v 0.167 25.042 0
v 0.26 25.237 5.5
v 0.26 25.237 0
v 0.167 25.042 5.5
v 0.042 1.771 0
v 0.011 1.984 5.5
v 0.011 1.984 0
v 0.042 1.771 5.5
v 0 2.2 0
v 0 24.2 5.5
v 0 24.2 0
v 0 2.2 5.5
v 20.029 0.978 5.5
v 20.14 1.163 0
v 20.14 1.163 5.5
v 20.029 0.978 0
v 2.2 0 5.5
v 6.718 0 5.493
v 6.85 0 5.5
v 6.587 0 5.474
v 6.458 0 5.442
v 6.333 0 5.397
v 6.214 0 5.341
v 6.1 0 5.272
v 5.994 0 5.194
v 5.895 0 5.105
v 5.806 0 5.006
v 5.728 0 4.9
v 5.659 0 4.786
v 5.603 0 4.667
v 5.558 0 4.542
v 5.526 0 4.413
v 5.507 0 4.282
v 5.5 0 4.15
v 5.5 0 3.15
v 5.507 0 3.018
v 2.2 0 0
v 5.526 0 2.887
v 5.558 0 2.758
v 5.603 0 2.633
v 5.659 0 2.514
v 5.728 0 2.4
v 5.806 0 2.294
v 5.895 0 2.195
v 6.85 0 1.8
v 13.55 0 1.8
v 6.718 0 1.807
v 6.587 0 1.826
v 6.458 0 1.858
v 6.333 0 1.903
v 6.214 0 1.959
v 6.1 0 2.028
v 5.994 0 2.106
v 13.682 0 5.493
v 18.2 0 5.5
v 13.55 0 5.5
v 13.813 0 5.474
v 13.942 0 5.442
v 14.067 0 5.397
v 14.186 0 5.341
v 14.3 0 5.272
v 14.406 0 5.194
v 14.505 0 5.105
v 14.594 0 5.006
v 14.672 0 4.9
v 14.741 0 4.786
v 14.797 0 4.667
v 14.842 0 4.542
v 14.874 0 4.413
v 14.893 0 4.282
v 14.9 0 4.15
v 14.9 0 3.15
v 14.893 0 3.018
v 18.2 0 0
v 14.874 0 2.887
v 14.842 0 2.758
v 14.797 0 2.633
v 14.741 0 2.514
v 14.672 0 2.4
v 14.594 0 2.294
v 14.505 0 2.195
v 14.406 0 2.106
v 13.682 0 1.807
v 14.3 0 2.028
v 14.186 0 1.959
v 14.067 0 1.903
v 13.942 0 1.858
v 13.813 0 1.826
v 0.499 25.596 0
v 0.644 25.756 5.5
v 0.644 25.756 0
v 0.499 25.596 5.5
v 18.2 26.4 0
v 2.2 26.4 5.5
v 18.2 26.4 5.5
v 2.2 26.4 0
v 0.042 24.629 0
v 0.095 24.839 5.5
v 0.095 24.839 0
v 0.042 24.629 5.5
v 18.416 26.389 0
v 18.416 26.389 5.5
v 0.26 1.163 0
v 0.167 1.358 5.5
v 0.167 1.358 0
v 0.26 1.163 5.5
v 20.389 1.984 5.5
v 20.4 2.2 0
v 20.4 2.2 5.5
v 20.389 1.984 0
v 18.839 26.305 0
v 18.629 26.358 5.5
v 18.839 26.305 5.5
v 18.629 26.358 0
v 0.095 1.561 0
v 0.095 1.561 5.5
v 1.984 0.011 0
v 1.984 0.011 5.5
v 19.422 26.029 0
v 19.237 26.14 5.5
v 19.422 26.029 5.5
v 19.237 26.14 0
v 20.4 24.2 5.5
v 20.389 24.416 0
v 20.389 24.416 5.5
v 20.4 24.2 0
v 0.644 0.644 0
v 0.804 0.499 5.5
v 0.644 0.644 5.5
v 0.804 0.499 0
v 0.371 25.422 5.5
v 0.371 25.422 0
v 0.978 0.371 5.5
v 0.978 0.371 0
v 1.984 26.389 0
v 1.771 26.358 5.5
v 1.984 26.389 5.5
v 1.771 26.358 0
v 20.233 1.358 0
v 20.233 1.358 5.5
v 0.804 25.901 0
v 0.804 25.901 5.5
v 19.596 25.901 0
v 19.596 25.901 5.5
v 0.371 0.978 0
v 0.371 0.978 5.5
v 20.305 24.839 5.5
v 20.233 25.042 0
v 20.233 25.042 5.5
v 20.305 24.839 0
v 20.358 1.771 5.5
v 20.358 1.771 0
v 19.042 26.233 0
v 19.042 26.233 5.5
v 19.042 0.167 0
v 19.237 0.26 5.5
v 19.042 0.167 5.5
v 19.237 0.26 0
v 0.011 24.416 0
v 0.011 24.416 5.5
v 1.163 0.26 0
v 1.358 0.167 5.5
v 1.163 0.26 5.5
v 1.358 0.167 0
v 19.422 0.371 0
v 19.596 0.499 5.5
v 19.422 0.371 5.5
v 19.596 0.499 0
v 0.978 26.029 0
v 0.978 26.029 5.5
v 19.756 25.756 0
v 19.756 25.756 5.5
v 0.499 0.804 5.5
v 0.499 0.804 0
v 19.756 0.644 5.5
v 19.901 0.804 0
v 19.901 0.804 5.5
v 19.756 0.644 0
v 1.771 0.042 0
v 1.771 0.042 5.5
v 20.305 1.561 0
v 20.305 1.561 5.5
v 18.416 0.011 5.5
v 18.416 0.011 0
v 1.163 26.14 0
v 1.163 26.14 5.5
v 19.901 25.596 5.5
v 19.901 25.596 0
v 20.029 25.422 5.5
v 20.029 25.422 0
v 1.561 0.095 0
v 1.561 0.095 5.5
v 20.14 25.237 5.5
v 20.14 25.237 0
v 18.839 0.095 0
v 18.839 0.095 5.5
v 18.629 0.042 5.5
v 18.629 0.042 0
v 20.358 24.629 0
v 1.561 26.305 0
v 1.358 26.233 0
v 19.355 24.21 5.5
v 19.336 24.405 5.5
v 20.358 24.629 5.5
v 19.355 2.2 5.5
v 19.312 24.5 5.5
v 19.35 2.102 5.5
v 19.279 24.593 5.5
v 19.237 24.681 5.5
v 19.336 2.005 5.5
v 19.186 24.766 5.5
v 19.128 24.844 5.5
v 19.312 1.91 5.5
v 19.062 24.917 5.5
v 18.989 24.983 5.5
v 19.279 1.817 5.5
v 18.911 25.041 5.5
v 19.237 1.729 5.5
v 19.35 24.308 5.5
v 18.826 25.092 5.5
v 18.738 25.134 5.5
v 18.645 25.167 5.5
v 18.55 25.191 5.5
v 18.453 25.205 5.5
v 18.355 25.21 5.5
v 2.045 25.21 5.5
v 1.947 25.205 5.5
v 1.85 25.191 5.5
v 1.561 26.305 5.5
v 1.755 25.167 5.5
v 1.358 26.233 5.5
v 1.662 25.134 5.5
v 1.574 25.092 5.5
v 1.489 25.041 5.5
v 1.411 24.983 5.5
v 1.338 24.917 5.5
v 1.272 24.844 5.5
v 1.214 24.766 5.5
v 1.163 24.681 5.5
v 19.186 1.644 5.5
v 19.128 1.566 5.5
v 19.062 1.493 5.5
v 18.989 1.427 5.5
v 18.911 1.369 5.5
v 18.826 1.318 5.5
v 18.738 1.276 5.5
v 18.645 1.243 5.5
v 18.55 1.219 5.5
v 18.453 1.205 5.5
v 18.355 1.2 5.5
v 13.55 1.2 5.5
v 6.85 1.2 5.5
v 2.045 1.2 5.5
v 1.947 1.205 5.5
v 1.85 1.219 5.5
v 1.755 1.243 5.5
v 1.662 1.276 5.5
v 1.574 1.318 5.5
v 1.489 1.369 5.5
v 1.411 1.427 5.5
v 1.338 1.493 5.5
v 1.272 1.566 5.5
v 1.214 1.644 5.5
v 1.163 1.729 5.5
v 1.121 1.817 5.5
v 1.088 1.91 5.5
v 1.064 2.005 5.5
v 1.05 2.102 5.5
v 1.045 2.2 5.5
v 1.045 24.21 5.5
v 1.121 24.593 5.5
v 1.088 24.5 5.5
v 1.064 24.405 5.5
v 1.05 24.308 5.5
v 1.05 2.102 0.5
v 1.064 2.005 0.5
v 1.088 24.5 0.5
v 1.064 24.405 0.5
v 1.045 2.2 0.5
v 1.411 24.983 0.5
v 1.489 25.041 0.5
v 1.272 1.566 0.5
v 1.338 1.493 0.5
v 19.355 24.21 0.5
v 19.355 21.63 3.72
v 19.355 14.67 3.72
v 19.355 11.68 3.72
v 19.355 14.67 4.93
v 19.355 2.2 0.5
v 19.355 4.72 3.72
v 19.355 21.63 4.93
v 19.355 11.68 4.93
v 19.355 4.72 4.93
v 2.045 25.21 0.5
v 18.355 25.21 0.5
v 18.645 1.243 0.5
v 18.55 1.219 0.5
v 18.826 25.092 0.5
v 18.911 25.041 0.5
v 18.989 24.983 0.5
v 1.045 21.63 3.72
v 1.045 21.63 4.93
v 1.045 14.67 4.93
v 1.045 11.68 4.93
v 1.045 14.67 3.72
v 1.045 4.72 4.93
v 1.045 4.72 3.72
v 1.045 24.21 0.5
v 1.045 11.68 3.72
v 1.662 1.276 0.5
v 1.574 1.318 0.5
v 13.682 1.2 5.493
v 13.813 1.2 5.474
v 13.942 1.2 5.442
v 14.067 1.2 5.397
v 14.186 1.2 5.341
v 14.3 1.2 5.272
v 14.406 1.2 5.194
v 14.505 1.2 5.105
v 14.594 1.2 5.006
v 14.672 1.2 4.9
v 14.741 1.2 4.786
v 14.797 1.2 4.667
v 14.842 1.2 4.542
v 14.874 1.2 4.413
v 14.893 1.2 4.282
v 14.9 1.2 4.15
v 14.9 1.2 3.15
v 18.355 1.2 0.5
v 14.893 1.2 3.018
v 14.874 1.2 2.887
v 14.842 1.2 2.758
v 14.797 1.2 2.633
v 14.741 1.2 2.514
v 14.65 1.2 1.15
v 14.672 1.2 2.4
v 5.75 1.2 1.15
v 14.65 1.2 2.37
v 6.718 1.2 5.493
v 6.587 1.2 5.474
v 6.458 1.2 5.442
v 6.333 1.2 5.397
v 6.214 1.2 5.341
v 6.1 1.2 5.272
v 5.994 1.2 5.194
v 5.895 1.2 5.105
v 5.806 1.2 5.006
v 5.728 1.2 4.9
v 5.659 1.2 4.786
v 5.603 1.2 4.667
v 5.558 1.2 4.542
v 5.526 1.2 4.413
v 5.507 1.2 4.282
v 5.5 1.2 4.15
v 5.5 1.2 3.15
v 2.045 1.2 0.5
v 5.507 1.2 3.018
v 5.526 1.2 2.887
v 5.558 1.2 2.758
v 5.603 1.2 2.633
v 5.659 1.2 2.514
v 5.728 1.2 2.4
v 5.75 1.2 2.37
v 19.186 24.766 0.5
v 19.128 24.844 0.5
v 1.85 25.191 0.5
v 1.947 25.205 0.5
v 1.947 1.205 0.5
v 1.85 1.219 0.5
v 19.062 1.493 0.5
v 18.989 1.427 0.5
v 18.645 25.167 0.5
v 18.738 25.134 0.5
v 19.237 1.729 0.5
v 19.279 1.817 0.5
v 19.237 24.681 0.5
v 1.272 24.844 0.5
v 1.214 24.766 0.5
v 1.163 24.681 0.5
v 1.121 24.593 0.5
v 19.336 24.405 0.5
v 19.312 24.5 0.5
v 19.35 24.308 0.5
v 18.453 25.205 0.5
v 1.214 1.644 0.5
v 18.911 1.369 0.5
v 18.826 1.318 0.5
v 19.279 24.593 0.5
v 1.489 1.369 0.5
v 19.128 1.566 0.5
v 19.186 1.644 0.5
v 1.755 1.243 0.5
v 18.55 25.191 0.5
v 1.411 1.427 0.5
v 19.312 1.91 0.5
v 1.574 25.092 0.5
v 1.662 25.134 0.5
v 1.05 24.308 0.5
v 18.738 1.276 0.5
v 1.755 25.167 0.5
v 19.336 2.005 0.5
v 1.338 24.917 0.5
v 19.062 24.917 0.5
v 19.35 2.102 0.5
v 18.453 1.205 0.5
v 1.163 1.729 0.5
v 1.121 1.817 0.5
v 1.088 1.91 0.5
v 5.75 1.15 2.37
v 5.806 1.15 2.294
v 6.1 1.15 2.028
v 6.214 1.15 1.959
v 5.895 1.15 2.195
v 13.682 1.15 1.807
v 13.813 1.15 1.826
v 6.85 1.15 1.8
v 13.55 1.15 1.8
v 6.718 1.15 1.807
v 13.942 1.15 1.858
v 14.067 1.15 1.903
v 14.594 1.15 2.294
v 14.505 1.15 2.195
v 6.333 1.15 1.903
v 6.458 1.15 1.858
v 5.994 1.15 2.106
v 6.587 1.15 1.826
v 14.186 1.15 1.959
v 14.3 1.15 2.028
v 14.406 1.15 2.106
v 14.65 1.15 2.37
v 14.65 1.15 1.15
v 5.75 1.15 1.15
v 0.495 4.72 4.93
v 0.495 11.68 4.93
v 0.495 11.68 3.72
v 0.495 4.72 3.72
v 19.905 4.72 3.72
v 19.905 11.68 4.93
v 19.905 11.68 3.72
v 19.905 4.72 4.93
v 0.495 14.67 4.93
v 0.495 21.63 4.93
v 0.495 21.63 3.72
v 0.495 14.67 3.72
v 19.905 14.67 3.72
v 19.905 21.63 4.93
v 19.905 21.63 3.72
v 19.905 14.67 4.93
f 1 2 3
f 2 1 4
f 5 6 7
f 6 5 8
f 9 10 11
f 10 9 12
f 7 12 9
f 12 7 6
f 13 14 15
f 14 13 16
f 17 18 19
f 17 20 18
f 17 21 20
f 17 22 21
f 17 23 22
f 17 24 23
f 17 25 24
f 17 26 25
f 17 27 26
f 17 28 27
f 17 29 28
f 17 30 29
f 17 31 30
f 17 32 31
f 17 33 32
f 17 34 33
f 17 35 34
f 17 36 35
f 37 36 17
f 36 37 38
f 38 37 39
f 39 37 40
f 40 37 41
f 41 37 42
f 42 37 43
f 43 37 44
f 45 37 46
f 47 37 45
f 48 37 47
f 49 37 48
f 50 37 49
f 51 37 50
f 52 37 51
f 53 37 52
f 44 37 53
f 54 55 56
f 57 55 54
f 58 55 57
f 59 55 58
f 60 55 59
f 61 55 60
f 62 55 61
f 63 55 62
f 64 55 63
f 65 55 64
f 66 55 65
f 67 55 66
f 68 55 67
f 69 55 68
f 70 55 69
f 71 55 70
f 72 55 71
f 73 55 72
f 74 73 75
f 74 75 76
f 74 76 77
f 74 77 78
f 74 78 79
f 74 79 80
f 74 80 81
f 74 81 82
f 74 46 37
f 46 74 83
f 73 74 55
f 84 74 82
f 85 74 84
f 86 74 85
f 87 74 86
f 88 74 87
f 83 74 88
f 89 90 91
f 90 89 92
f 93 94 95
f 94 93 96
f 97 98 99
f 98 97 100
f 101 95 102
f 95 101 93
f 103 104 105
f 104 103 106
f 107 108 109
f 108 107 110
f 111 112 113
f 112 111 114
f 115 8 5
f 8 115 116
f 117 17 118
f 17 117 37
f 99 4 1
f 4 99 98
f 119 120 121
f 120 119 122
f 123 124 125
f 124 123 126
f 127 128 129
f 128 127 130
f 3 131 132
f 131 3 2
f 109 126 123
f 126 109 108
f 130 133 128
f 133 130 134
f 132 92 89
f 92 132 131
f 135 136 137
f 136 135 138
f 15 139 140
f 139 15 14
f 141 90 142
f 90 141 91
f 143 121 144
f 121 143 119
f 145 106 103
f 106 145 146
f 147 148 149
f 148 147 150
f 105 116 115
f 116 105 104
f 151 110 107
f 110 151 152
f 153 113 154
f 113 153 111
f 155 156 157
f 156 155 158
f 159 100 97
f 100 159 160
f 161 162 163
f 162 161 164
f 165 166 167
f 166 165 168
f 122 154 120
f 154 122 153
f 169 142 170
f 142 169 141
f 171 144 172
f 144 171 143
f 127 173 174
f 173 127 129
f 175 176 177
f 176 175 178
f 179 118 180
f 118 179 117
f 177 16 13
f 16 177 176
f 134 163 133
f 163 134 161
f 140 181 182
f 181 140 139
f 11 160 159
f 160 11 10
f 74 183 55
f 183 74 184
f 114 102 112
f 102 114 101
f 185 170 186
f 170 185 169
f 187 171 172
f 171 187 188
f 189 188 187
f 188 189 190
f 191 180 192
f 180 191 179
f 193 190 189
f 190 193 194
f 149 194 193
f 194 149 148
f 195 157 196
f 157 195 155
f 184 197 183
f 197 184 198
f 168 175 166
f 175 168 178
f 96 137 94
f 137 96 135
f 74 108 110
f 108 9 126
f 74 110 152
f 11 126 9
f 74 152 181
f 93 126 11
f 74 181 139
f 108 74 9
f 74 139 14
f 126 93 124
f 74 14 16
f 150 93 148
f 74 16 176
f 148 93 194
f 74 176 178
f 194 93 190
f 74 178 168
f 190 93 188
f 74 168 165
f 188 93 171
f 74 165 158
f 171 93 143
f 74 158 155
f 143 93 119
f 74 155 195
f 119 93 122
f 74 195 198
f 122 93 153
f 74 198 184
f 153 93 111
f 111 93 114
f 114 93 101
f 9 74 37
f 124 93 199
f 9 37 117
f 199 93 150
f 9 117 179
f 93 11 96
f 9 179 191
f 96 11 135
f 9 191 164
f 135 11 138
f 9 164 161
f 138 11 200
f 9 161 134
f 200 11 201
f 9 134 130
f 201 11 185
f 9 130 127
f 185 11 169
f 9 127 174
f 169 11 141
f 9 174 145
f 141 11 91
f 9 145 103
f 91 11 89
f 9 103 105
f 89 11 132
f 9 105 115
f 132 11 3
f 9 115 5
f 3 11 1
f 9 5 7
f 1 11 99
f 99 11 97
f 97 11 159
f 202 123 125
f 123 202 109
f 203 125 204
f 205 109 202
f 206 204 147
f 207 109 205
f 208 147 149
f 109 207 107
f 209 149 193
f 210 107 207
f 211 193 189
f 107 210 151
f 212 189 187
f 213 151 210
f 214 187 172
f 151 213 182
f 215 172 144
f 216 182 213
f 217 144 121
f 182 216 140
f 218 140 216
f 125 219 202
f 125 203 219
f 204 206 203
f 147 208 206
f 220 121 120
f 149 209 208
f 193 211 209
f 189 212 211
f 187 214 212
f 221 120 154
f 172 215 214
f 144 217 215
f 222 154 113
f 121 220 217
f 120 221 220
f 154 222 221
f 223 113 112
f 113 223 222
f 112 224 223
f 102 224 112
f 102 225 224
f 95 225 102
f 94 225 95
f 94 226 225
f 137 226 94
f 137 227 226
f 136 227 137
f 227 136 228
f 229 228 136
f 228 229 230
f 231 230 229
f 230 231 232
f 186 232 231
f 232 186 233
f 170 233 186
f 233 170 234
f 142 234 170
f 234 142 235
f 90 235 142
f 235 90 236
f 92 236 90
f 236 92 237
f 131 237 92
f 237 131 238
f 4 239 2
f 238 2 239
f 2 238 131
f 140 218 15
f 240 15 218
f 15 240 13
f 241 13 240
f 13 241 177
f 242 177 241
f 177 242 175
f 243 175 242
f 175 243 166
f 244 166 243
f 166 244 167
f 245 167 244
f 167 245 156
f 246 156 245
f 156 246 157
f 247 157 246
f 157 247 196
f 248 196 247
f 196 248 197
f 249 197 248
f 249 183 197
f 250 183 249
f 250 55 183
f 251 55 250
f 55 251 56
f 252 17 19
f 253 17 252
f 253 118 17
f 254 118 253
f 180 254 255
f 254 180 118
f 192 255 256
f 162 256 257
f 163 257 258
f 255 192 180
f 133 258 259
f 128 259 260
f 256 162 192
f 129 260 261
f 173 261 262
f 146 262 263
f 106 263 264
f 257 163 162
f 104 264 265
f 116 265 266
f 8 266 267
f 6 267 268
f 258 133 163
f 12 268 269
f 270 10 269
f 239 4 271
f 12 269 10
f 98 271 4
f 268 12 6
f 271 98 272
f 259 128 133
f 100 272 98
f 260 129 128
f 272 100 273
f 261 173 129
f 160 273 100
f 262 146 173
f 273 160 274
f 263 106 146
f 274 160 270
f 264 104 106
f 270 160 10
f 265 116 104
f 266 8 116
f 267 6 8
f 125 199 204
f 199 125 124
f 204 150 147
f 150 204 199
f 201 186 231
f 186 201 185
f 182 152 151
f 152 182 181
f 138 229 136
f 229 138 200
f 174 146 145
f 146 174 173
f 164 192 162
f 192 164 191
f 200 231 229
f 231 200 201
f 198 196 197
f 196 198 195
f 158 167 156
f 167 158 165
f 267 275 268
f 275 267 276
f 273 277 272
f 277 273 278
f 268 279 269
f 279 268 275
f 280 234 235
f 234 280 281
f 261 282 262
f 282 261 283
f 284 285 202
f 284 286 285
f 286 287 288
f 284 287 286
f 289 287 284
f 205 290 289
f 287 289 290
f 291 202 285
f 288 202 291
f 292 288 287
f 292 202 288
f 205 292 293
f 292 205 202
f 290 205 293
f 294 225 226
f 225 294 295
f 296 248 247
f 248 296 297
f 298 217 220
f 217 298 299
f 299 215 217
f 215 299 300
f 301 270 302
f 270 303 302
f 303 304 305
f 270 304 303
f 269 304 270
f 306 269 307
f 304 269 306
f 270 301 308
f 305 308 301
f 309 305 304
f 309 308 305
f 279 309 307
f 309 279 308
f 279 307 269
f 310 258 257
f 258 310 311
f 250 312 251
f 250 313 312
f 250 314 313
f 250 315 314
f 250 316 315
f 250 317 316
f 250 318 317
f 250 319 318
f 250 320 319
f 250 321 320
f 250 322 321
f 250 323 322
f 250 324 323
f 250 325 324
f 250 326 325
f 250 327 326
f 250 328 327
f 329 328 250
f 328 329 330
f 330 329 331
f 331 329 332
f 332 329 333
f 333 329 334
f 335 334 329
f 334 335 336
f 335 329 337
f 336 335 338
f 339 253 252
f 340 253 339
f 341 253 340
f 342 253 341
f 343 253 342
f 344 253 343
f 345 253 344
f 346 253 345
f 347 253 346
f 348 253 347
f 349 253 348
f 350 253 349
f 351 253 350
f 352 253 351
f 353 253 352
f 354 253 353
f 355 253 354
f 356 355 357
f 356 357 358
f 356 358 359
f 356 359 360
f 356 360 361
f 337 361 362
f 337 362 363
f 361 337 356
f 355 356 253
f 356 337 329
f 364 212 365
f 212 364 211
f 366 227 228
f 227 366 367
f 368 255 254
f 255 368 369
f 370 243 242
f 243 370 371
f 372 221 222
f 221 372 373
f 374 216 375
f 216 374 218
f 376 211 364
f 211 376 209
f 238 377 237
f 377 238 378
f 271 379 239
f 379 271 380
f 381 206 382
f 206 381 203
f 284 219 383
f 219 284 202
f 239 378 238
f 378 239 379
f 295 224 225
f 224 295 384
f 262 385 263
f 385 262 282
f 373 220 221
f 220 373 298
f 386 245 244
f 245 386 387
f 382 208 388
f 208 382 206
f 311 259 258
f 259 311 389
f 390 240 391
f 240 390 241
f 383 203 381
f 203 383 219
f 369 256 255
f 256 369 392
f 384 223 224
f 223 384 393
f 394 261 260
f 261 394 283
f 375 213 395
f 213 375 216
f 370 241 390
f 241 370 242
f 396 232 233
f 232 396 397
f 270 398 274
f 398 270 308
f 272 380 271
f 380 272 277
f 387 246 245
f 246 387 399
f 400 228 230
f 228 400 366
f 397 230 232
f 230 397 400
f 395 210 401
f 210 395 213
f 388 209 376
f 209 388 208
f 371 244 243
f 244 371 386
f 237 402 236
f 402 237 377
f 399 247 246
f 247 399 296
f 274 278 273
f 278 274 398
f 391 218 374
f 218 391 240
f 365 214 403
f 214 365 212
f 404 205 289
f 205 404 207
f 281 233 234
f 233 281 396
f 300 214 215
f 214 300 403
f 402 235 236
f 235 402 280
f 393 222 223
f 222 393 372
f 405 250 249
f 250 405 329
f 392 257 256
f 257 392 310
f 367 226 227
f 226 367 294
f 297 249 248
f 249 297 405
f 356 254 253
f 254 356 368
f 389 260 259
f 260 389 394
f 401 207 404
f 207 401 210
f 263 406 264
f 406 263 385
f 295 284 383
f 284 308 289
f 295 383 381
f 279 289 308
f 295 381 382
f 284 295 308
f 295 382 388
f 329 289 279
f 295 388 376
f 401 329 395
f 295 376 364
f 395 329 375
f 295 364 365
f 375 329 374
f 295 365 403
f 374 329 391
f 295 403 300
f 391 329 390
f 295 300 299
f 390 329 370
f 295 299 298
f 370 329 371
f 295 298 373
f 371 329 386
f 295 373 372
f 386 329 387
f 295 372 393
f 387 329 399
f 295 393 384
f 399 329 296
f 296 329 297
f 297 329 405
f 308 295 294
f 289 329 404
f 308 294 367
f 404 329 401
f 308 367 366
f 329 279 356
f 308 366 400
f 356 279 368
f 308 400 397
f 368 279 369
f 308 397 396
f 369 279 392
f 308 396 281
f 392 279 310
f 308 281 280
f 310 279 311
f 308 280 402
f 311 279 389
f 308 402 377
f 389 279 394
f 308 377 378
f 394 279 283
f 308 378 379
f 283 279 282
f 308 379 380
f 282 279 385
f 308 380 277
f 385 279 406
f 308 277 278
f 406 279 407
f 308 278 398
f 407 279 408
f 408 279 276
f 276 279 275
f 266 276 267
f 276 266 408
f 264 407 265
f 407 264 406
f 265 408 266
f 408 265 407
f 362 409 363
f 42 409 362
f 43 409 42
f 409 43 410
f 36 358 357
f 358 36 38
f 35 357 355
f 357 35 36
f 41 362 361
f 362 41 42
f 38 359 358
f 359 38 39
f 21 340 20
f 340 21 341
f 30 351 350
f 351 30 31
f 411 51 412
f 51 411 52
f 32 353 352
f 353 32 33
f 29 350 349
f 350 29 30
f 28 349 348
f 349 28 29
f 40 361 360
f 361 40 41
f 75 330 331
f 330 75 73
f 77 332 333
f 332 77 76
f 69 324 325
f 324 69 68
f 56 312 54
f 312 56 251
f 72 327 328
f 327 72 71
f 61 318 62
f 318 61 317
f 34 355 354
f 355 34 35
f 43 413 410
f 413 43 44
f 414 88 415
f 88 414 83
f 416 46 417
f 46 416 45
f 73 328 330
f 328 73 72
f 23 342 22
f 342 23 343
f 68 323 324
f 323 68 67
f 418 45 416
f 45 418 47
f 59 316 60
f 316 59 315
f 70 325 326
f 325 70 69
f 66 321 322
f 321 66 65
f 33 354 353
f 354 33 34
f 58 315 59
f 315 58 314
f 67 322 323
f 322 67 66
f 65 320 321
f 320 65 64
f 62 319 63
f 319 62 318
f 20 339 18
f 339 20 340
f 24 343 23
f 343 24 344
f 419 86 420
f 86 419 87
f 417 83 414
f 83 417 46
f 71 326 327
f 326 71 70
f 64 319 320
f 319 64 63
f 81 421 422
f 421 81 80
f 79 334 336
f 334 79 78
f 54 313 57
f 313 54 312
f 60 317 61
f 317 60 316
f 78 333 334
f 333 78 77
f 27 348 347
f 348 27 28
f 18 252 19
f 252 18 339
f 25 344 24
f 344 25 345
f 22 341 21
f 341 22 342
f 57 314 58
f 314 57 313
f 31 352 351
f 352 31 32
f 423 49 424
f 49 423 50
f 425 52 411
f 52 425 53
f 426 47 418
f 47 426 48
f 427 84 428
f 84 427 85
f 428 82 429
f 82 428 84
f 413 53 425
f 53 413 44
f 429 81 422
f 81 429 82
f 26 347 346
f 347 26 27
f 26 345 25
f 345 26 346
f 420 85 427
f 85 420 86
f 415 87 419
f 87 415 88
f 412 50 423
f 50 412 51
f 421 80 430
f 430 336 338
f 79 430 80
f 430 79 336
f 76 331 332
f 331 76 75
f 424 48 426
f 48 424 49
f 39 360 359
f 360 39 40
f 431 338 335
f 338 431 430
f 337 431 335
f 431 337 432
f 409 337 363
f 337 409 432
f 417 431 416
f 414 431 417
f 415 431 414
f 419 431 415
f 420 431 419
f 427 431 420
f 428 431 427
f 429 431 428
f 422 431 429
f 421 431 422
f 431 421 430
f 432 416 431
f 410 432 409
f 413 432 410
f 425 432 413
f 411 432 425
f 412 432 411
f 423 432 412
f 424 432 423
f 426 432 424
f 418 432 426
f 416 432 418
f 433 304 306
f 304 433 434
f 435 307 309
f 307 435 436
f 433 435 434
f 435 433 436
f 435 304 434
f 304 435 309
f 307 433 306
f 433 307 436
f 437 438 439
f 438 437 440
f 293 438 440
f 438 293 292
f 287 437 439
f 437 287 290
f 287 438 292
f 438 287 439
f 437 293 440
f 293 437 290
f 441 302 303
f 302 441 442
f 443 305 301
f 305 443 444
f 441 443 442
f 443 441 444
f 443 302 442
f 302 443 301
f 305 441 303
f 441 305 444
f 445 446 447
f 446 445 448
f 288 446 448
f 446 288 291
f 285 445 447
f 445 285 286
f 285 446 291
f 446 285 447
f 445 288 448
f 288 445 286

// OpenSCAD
// Waveshare ESP32-S3-Zero case with two button actuators
// v32: tightens the button-to-cutout gaps and adds LED light-pipe glue/retention features.
// v31: removes the raised edge/stiffening rib on the top cap, widens the button pads, and changes the switch contact nubs from cones to flat cylinders.
// v30: fixes snap receiver pockets so they are derived from the same tab coordinates and correct installed Z height.
// v29: sets measured lid-to-button gap to 1.80 mm and derives the top button nub height from it.
// v28: removes board support rails, sets USB opening bottom to 1.80 mm, interior height to 5.00 mm, and lid rim depth to 3.25 mm.
// v27: removes the rear/back segment of the top cap underside rim.
// v26: floor_h=0.50, rail_h=0.50, USB slot z0=2.30, and cap rim calculated to slightly touch the 1.6 mm PCB.
// v24: USB relief is localized to the connector body only, not a full-height pocket around the opening.
// v23: cleans the USB/front wall area and adds a matching USB clearance notch in the snap-on top cap.
// v22: adds engraved button designations on the outside/top face of the cap.
// v21: LED window reworked as a captured separate clear light-pipe part for slicers.
// - Default all view shows bottom tray, top lid/cap, and the clear LED pipe installed in the lid.
// - Export top/lid/cap produces the actual snap-on clamshell lid with a clean LED hole.
// - Export led_insert produces only the clear LED pipe, aligned to the top lid origin.
// - The LED pipe has a small underside flange so it is retained and slicers stop confusing it with a loose center circle.
// Button islands are full top-plate thickness; only the press nubs project from the inside face.
// Buttons, LED window/clear insert, and button contact nubs are on the TOP piece.
// Bottom is a closed tray for the board, rails, USB-C side opening, and snap receivers.
// v10 base was fit-checked against the uploaded ESP32-S3-Zero STEP model.
// Board/button coordinates below are extracted from the STEP CARTESIAN_POINT data, not eyeballed from the drawing.
// Recreated from STL measurements (not a mesh import).
// Coordinate system: base lower-left-front corner = [0,0,0]. Units: mm.

$fn = 64;

// Export selector:
//   "all"       = bottom tray + TOP LID/CAP + clear LED insert laid out as separate printable bodies
//   "base"      = base only
//   "led_insert"= clear LED plug only, at the SAME origin as the top so it can be imported as an aligned part
//   "led_insert_layout" = clear LED plug laid out next to the cap for visual checking
//   "top_with_led_preview" = top with LED insert shown in-place for checking only, not for multi-material export
//   "top"/"lid"/"cap" = snap-on clamshell top lid only
//   "lid_split" = split two-piece lid laid out together
//   "lid_left"  = left-side lid half
//   "lid_right" = right-side lid half
//   "lid_front" = legacy alias for left-side lid half
//   "lid_back"  = legacy alias for right-side lid half
// This makes it easier to import the LED insert as a separate part and assign clear PLA.
export_part = "base";   // default: bottom + TOP LID + separate LED insert laid out side-by-side

// ---------------- measured outer dimensions ----------------
base_w = 20.40;
base_d = 26.40;
floor_h = 0.50;      // v26/v28: thin closed bottom floor
interior_h = 5.00;   // v28: full inside height above floor
base_h = floor_h + interior_h;  // outside height = bottom floor + interior = 5.50 mm
corner_r = 2.20;
wall_t  = 1.20;

// Waveshare ESP32-S3-Zero board outline from drawing.
board_w = 18.01;          // STEP board max X ~18.0087 mm
board_d = 23.51;          // STEP board max Y ~23.5086 mm
board_corner_r = 1.00;
board_clear_x = 0.30;      // FDM clearance; v8 had exactly 18.00 mm and would be too tight
board_clear_y = 0.50;
board_x0 = (base_w - board_w) / 2;
board_y0 = 1.20;           // board USB edge sits against the inside of the connector wall

// Interior tray opening. Slightly widened vs the measured STL so the 18.00 mm board actually fits.
inner_x0 = board_x0 - board_clear_x/2;
inner_x1 = board_x0 + board_w + board_clear_x/2;
inner_y0 = board_y0;
inner_y1 = board_y0 + board_d + board_clear_y;

// Raised internal side rails measured at z=1.2..2.95
rail_w = 1.50;
rail_h = 0.00;       // v28: rails removed; board sits on the floor
rail_z = floor_h;
rail_y0 = 1.20;
rail_y1 = 25.20;
rail_inner_left_x0  = inner_x0;
rail_inner_left_x1  = inner_x0 + rail_w;
rail_inner_right_x0 = inner_x1 - rail_w;
rail_inner_right_x1 = inner_x1;
rail_r = 0.45;

// USB-C opening.
// USB-C receptacle shell is roughly 8.4 x 2.6 mm; these are printable clearance dimensions.
// The original STL connector access was on the front-notch end, not the opposite wall.
// Toggle usb_on_back_wall if your slicer/model coordinate view shows it on the wrong edge.
// USB-C connector mouth/plug clearance. USB-C receptacle shell is about 8.4 x 2.6 mm;
// 9.4 x 3.7 gives sane FDM clearance without turning it into the old giant notch.
usb_c_open_w  = 9.40;
usb_c_open_h  = 3.70;
usb_c_open_r  = 1.35;
usb_c_center_x = board_x0 + board_w/2;
usb_c_open_x0 = usb_c_center_x - usb_c_open_w/2;
usb_c_open_z0 = 1.80;     // v28: USB-C opening bottom height
usb_on_back_wall = false;   // false = original notch/button end at y=0; true = opposite wall at y=base_d

// v24 USB cleanup / lid relief.
// Do NOT make a big full-height pocket around the whole USB opening.
// The only extra inside clearance is a localized pocket for the USB-C metal body
// where it projects back into the case over the PCB.
usb_inner_pocket = false;              // legacy v23 big bay; keep OFF
usb_body_pocket = true;                // localized connector-body relief only
usb_body_pocket_w = 8.90;              // USB-C receptacle body width; not cable shell width
usb_body_pocket_h = 3.10;              // local body height
usb_body_pocket_depth = 3.10;          // how far the connector body projects into the box
usb_body_pocket_z0 = floor_h + rail_h + 0.65; // bottom of relief: board support + approx PCB/top offset

// Matching clearance in the TOP cap/lid so it closes around the USB-C receptacle body.
// v25 IMPORTANT: this is NOT a through-cut in the visible top lid.
// It cuts only the underside plug/rim/skirt -- the part that inserts into the bottom box.
cap_usb_notch = true;
cap_usb_notch_w = usb_body_pocket_w + 0.90;
cap_usb_notch_depth = usb_body_pocket_depth + 0.70;
cap_usb_notch_extra_h = 0.30;
cap_usb_cut_visible_top = false;     // keep false: only notch the underside rim, not the top plate
cap_usb_notch_z_clear = 0.03;        // tiny overlap so CSG cleanly removes the rim material

// The old bottom pry relief overlapped visually with the USB area. Default off in v23.
bottom_pry_relief = false;

// Original STL had an open floor channel here. v6 closes the bottom/floor,
// leaving only the USB-C wall opening above.
front_cut_x0 = 5.70;
front_cut_x1 = 14.70;
front_cut_y1 = 7.99;

// Center LED window. The base still has a circular cutout, but v11 adds a matching
// separate insert object so this area can be assigned to clear PLA/transparent filament
// in the slicer. For a single-material print, set show_led_insert = false.
center_hole_x = 10.20;
center_hole_y = 10.20;
center_hole_r = 1.50;          // nominal LED location radius from original STL

// v21 LED lens/light-pipe parameters.
// The top lid gets a slightly oversized clean hole. The separate clear part has a
// smaller flush shaft plus a larger underside flange, like a tiny rivet/mushroom.
// This is more slicer-friendly than a same-radius cylinder touching the lid wall.
led_hole_r = 1.3;             // hole cut in the top lid
led_pipe_r = 1.50;             // v32: tighter fit in hole; still leaves ~0.08 mm radial clearance
led_pipe_h = 1.47;             // should be cap_top_h + tiny overlap; set after cap_top_h if you change cap_top_h
led_flange_r = 2.35;           // v32: larger hidden glue flange/washer
led_flange_h = 0.60;           // v32: taller flange gives more glue area
led_retention_ribs = true;     // v32: tiny ribs on clear pipe for glue/friction
led_retention_rib_count = 4;
led_retention_rib_w = 0.20;
led_retention_rib_out = 0.10;
led_insert_top_proud = 0.00;   // keep outside face flush; do not make proud unless you want a bump
show_led_insert = true;        // preview/layout only. Export top and led_insert separately for multi-material.

// Button/keyhole actuator geometry.
// STEP-measured switch bodies: 3.00 x 2.50 mm.
// STEP switch centers in board coordinates, with board origin at lower-left / non-USB end:
//   left  = [4.870, 14.83863]
//   right = [13.220, 14.83863]
// Because the case coordinate origin is at the USB/front edge, convert Y as:
//   case_y = board_y0 + board_d - step_switch_y_from_non_usb_end
step_btn_left_x = 4.870;
step_btn_right_x = 13.220;
step_btn_y_from_non_usb_end = 14.83862964;
btn_y = board_y0 + board_d - step_btn_y_from_non_usb_end;
btn_left_x = board_x0 + step_btn_left_x;
btn_right_x = board_x0 + step_btn_right_x;
btn_outer_r = 1.75;
btn_inner_r = 1.48;      // v32: larger pad, smaller visible clearance gap
btn_stem_w = 2.05;       // v32: wider actuator tongue / base
btn_clear_w = 2.40;      // v32: reduced gap around tongue; increase if it fuses
btn_stem_y0 = btn_y;
btn_stem_y1 = board_y0 + 15.80;

// Raised contact points on the inside/top of the two flexible printed buttons.
// These are the parts that actually reach the tactile switches. Tune nub_h after test fitting:
// too low = no click; too high = button held down constantly.
button_nub_r1 = 0.80;
button_nub_r2 = 0.22;
button_nub_h  = 0.55;
button_nub_z0 = floor_h - 0.01;   // legacy/base-button value, not used by v16 top buttons

// v16 top-cover button settings. The top panel is thicker for stiffness, but the
// two button islands/tongues are thinner so they can flex. In print orientation,
// the outside/top face is z=0 and these features grow upward into the inside of the cap.
top_button_flex_h = 1.45;        // v18: explicit full top thickness; avoids pre-definition weirdness/towers
top_button_nub_r1 = 1.05;     // v31: wider flat contact foot
top_button_nub_r2 = 1.05;     // v31: same as r1, so this is a flat cylinder, not a cone

// v29 button reach. You measured 1.80 mm from the inside/top case surface to the tactile switch button.
// Leave a tiny gap so the switch is not held down constantly. Set this to 0.00 if you want it just touching.
top_button_gap_to_switch = 1.80;
top_button_idle_clearance = 0.05;
top_button_nub_h = top_button_gap_to_switch - top_button_idle_clearance;  // 1.75 mm default

// Button designations on the visible outside face of the top cap.
// Default is tiny engraved B/R because the part is small. Set to "BOOT" / "RST"
// if you prefer words, but reduce label_size or move the positions if they crowd the buttons.
button_labels = true;
button_label_left = "B";        // board label: BOOT
button_label_right = "R";       // board label: RESET/RST
button_label_size = 1.65;
button_label_depth = 0.28;      // engraved depth into outside face; keep shallow so buttons stay strong
button_label_font = "Liberation Sans:style=Bold";
button_label_on_button = true;  // true = engrave on round button pads; false = labels just below buttons
button_label_y_offset = -0.05;  // fine tune on button when button_label_on_button=true
button_label_side_y_offset = -3.35; // used when button_label_on_button=false

// Separate lid as printed next to the case
part_gap = 2.05;
lid_w = 18.50;
lid_d = 23.80;
lid_h = 1.20;
lid_corner_r = 1.35;
lid_tab_out = 0.35;
lid_tab_y0 = 7.44;
lid_tab_y1 = 16.44;

// Split-lid / anti-flimsy options.
// v14 splits the lid the OTHER WAY: left/right halves, with the seam running front-to-back.
// This matches the style in your photo better than the previous USB/rear split.
lid_split_x = lid_w / 2;
lid_split_clearance = 0.28;      // gap between left/right lid halves at the center seam
lid_reinforce_h = 0.65;          // raised seam-rail height above lid_h
lid_reinforce_w = 1.05;          // width of each raised seam rail, measured in X
lid_reinforce_inset_y = 1.35;    // keep seam rails away from rounded front/back ends

// Small pry notch at one end of the center seam. The two half-notches combine into a tool/fingernail slit.
lid_pry_slit_l = 5.00;           // length of pry notch along Y
lid_pry_slit_w = 0.90;           // width of notch into each half along X
lid_pry_slit_end = "front";      // "front" = USB/button end, "back" = rear end

// Optional little raised alignment bead along the seam. This is only a low-profile top feature;
// it stiffens and gives your finger/tool a ridge without adding underside geometry that could hit the board.
lid_center_bead = true;
lid_center_bead_w = 0.55;
lid_center_bead_h = 0.35;
lid_side_label = false;          // tiny preview text labels; set false for final export

// Preview-only board fit checker. Leave false for STL export. Set true in OpenSCAD preview to see
// whether the board outline, buttons, and USB-C opening line up.
show_board_check = false;
board_preview_z = floor_h + 0.05;
button_preview_r = 1.35;
switch_body_w = 3.00;      // from STEP: BUTTON-2X3XH1_5 body X span
switch_body_d = 2.50;      // from STEP: body Y span
switch_body_h = 1.60;      // from STEP body height

// ---------------- helper geometry ----------------
module rounded_rect_2d(w, d, r) {
    hull() {
        translate([r, r]) circle(r=r);
        translate([w-r, r]) circle(r=r);
        translate([r, d-r]) circle(r=r);
        translate([w-r, d-r]) circle(r=r);
    }
}

module rect_from_to(x0,y0,x1,y1) {
    translate([x0,y0]) square([x1-x0, y1-y0], center=false);
}

module rounded_box(w,d,h,r) {
    linear_extrude(height=h) rounded_rect_2d(w,d,r);
}

// Rounded opening extruded through a Y-facing wall.
// The 2D rounded rectangle is drawn in X/Z and extruded along Y.
module y_wall_rounded_opening(x0, y_inside, z0, w, h, r, depth, front=true) {
    rr = min(r, min(w,h)/2 - 0.01);
    if (front) {
        // Front/connector end at y=0.  Start just inside the wall and cut outward through y=0.
        translate([x0, y_inside, z0])
            rotate([90, 0, 0])
                linear_extrude(height=depth)
                    rounded_rect_2d(w, h, rr);
    } else {
        // Rear wall at y=base_d.  Start just inside the rear wall and cut outward through y=base_d.
        translate([x0, y_inside, z0])
            rotate([-90, 0, 0])
                linear_extrude(height=depth)
                    rounded_rect_2d(w, h, rr);
    }
}

module usb_c_wall_opening() {
    if (usb_on_back_wall)
        y_wall_rounded_opening(usb_c_open_x0, base_d - wall_t + 0.20, usb_c_open_z0, usb_c_open_w, usb_c_open_h, usb_c_open_r, wall_t + 1.00, false);
    else
        y_wall_rounded_opening(usb_c_open_x0, wall_t + 0.20, usb_c_open_z0, usb_c_open_w, usb_c_open_h, usb_c_open_r, wall_t + 1.00, true);
}

module usb_inner_pocket_cutter() {
    // Legacy v23 broad cleanup bay. Kept for comparison only; default OFF in v24.
    if (usb_inner_pocket) {
        translate([usb_c_center_x - (usb_c_open_w/2 + 1.15),
                   wall_t - 0.05,
                   floor_h - 0.02])
            cube([usb_c_open_w + 2*1.15,
                  3.60 + 0.05,
                  base_h - floor_h + 0.06]);
    }
}

module usb_body_pocket_cutter() {
    // v24: localized relief only around the USB-C connector body that protrudes
    // back into the case. This does not carve a tall pocket around the full opening.
    if (usb_body_pocket) {
        translate([usb_c_center_x - usb_body_pocket_w/2,
                   wall_t - 0.05,
                   usb_body_pocket_z0])
            cube([usb_body_pocket_w,
                  usb_body_pocket_depth + 0.05,
                  usb_body_pocket_h]);
    }
}

module cap_usb_notch_cutter() {
    // v25: clearance for the USB-C connector is cut ONLY from the cap's underside rim/skirt,
    // i.e. the part of the lid that inserts down into the bottom box.
    // It should not break through the visible/top outside surface of the lid.
    if (cap_usb_notch) {
        if (cap_usb_cut_visible_top) {
            // Debug/legacy behavior: through-cut the whole lid. Usually NOT what we want.
            translate([usb_c_center_x - cap_usb_notch_w/2,
                       -0.08,
                       -0.03])
                cube([cap_usb_notch_w,
                      cap_usb_notch_depth + 0.08,
                      cap_top_h + cap_rim_h + cap_top_rib_h + cap_usb_notch_extra_h]);
        } else {
            // Correct behavior: start at the underside rim level, after the top plate.
            // The rim begins at cap_rim_y0, so the cut is localized to the insert/skirt,
            // not the outside front edge of the lid.
            translate([usb_c_center_x - cap_usb_notch_w/2,
                       cap_rim_y0 - 0.08,
                       cap_top_h - cap_usb_notch_z_clear])
                cube([cap_usb_notch_w,
                      cap_usb_notch_depth + 0.08,
                      cap_rim_h + 2*cap_usb_notch_z_clear]);
        }
    }
}

// The actual solid button actuator: round pad plus narrow tongue.
module button_actuator_2d(cx) {
    union() {
        translate([cx, btn_y]) circle(r=btn_inner_r);
        rect_from_to(cx-btn_stem_w/2, btn_stem_y0, cx+btn_stem_w/2, btn_stem_y1);
    }
}

// The keyhole-shaped clearance removed from the floor.
// Subtracting this leaves the button actuator island/tongue behind.
module button_clearance_2d(cx) {
    difference() {
        union() {
            translate([cx, btn_y]) circle(r=btn_outer_r);
            rect_from_to(cx-btn_clear_w/2, btn_stem_y0, cx+btn_clear_w/2, btn_stem_y1);
        }
        button_actuator_2d(cx);
    }
}

module floor_plan_2d() {
    difference() {
        rounded_rect_2d(base_w, base_d, corner_r);

        // v6: NO front floor/channel cut here. Bottom is closed in.

        // Center through-hole.
        translate([center_hole_x, center_hole_y]) circle(r=center_hole_r);

        // Keyhole clearances, leaving the actual buttons/tongues solid.
        button_clearance_2d(btn_left_x);
        button_clearance_2d(btn_right_x);
    }
}

module base_floor() {
    linear_extrude(height=floor_h) floor_plan_2d();
}

module outer_wall_shell() {
    difference() {
        rounded_box(base_w, base_d, base_h, corner_r);

        // Hollow tray. Starts above the bottom plate.
        translate([inner_x0, inner_y0, floor_h])
            linear_extrude(height=base_h-floor_h+0.02)
                rounded_rect_2d(inner_x1-inner_x0, inner_y1-inner_y0, max(corner_r-wall_t,0.01));

        // Proper USB-C wall opening only, with closed bottom/floor below it.
        usb_c_wall_opening();

        // Keep floor/keyhole pattern from being filled by the shell body.
        translate([-0.01,-0.01,-0.01])
            linear_extrude(height=floor_h+0.02)
                difference() {
                    rounded_rect_2d(base_w+0.02, base_d+0.02, corner_r);
                    floor_plan_2d();
                }
    }
}

module side_rail(x0,x1) {
    translate([x0, rail_y0, rail_z])
        linear_extrude(height=rail_h)
            offset(r=rail_r) offset(delta=-rail_r)
                square([x1-x0, rail_y1-rail_y0], center=false);
}

module button_contact_nub(cx) {
    // A small conical contact point on the inside face of each flex button.
    // It concentrates the press at the tactile switch center and gives a little extra reach.
    translate([cx, btn_y, button_nub_z0])
        cylinder(h=button_nub_h, r1=button_nub_r1, r2=button_nub_r2);
}

module button_contact_nubs() {
    button_contact_nub(btn_left_x);
    button_contact_nub(btn_right_x);
}

module led_window_insert() {
    // v32: separate clear-PLA LED light pipe with a larger glue flange plus small ribs.
    // Print/import this as a separate aligned part. The outside face is flush at z=0.
    // Add a dot of CA/UV glue around the underside flange after printing.
    color([0.75, 1.0, 1.0, 0.45])
        union() {
            // visible flush shaft through the top lid
            translate([center_hole_x, center_hole_y, 0])
                cylinder(h=led_pipe_h + led_insert_top_proud, r=led_pipe_r);

            // tiny vertical ribs: more glue/friction surface without changing the visible circle much
            if (led_retention_ribs) {
                for (i=[0:led_retention_rib_count-1]) {
                    rotate([0,0,360*i/led_retention_rib_count])
                        translate([center_hole_x + led_pipe_r - 0.02, center_hole_y - led_retention_rib_w/2, 0.12])
                            cube([led_retention_rib_out, led_retention_rib_w, cap_top_h - 0.18]);
                }
            }

            // hidden inner glue flange/washer. Slight z overlap avoids paper-thin slicer gaps.
            translate([center_hole_x, center_hole_y, cap_top_h - 0.02])
                cylinder(h=led_flange_h, r=led_flange_r);
        }
}

module base_case() {
    // v16: bottom is a plain closed tray. No button cutouts, no LED hole, no button nubs.
    // The buttons/LED live in the snap-on top cover.
    union() {
        difference() {
            rounded_box(base_w, base_d, base_h, corner_r);

            // Hollow tray starts above the closed bottom floor.
            translate([inner_x0, inner_y0, floor_h])
                linear_extrude(height=base_h-floor_h+0.02)
                    rounded_rect_2d(inner_x1-inner_x0, inner_y1-inner_y0, max(corner_r-wall_t,0.01));

            // USB-C wall opening remains in the tray wall.
            usb_c_wall_opening();
            usb_inner_pocket_cutter();
            usb_body_pocket_cutter();
        }
        // v28: board support rails removed. Board sits directly on the 0.50 mm floor.
        // side_rail(rail_inner_left_x0, rail_inner_left_x1);
        // side_rail(rail_inner_right_x0, rail_inner_right_x1);
    }
}


module lid_2d() {
    union() {
        rounded_rect_2d(lid_w, lid_d, lid_corner_r);
        // Long centered side tabs/ears measured at Y 7.44..16.44
        rect_from_to(-lid_tab_out, lid_tab_y0, 0.05, lid_tab_y1);
        rect_from_to(lid_w-0.05, lid_tab_y0, lid_w+lid_tab_out, lid_tab_y1);
    }
}

module lid() {
    linear_extrude(height=lid_h) lid_2d();
}

module lid_half_mask_2d(left=true) {
    // v14: split left/right. The seam runs front-to-back along Y.
    if (left)
        rect_from_to(-5, -5, lid_split_x - lid_split_clearance/2, lid_d+5);
    else
        rect_from_to(lid_split_x + lid_split_clearance/2, -5, lid_w+5, lid_d+5);
}

module lid_pry_slit_2d(left=true) {
    // Notch at one end of the center seam. The two half-notches combine into a small pry slit.
    y0 = (lid_pry_slit_end == "front") ? -0.05 : lid_d - lid_pry_slit_l + 0.05;
    if (left)
        translate([lid_split_x - lid_split_clearance/2 - lid_pry_slit_w, y0])
            square([lid_pry_slit_w, lid_pry_slit_l], center=false);
    else
        translate([lid_split_x + lid_split_clearance/2, y0])
            square([lid_pry_slit_w, lid_pry_slit_l], center=false);
}

module split_lid_half_2d(left=true) {
    difference() {
        intersection() {
            lid_2d();
            lid_half_mask_2d(left);
        }
        lid_pry_slit_2d(left);
    }
}

module split_lid_ridge(left=true) {
    // Raised rib parallel to the front/back direction, right next to the split.
    // Together, the two halves form a central stiffening ridge/seam.
    ridge_x = left ? (lid_split_x - lid_split_clearance/2 - lid_reinforce_w)
                   : (lid_split_x + lid_split_clearance/2);
    translate([ridge_x, lid_reinforce_inset_y, lid_h])
        cube([lid_reinforce_w, lid_d - 2*lid_reinforce_inset_y, lid_reinforce_h]);

    // Optional small bead right at the inside edge of each half for more definition at the seam.
    if (lid_center_bead) {
        bead_x = left ? (lid_split_x - lid_split_clearance/2 - lid_center_bead_w)
                      : (lid_split_x + lid_split_clearance/2);
        translate([bead_x, lid_reinforce_inset_y, lid_h + lid_reinforce_h])
            cube([lid_center_bead_w, lid_d - 2*lid_reinforce_inset_y, lid_center_bead_h]);
    }
}

module split_lid_half(left=true) {
    union() {
        linear_extrude(height=lid_h) split_lid_half_2d(left);
        split_lid_ridge(left);
        if (lid_side_label) {
            label_txt = left ? "LEFT" : "RIGHT";
            translate([left ? lid_w*0.25 : lid_w*0.75, lid_d/2, lid_h+0.02])
                linear_extrude(height=0.18)
                    text(label_txt, size=1.4, halign="center", valign="center");
        }
    }
}

module split_lid_pair() {
    // Lay the two halves side-by-side for easy printing. The installed seam is lengthwise.
    split_lid_half(true);
    translate([lid_w + 2.0, 0, 0]) split_lid_half(false);
}


module board_preview() {
    // Thin ghost board, placed where it should sit in the tray.
    color([0,0.25,1,0.35])
        translate([board_x0, board_y0, board_preview_z])
            linear_extrude(height=0.80)
                rounded_rect_2d(board_w, board_d, board_corner_r);

    // STEP-measured tactile switch bodies and plunger centers. These should sit below the two actuator pads.
    color([1,0.15,0.05,0.38]) {
        translate([btn_left_x-switch_body_w/2, btn_y-switch_body_d/2, board_preview_z + 0.80])
            cube([switch_body_w, switch_body_d, switch_body_h]);
        translate([btn_right_x-switch_body_w/2, btn_y-switch_body_d/2, board_preview_z + 0.80])
            cube([switch_body_w, switch_body_d, switch_body_h]);
    }
    color([1,0,0,0.78]) {
        translate([btn_left_x, btn_y, board_preview_z + 2.45]) cylinder(h=0.35, r=button_preview_r);
        translate([btn_right_x, btn_y, board_preview_z + 2.45]) cylinder(h=0.35, r=button_preview_r);
    }

    // USB-C shell / mouth check at the connector wall.
    color([1,0.5,0,0.65])
        translate([usb_c_open_x0, -0.35, usb_c_open_z0])
            cube([usb_c_open_w, 0.70, usb_c_open_h]);
}



// ---------------- v15 true clamshell snap-on top ----------------
// This is NOT a left/right split lid. It is a separate top half that snaps onto the bottom tray.
// The cap is a shallow inverted tray: solid top panel + downward inner skirt/rim.
// The bottom gets small receiver reliefs/pockets for the cap snap tabs.

// Installed cap sizing. The top panel intentionally follows the same footprint as the bottom,
// while an underside rim fits into the tray opening. This keeps the outside size compact.
cap_w = base_w;
cap_d = base_d;
cap_top_h = 1.45;             // thicker/stiffer than the original 1.2 mm lid
cap_corner_r = corner_r;

// Underside plug/rim that drops into the bottom tray.
// v26 rim calculation:
// v28 geometry:
// PCB bottom = floor_h = 0.50 mm because board rails are removed.
// PCB top    = floor_h + pcb_thickness = 0.50 + 1.60 = 2.10 mm.
// Interior top = base_h = 5.50 mm, with 5.00 mm clear height above the floor.
// Rim bottom when assembled = base_h - cap_rim_h = 5.50 - 3.25 = 2.25 mm.
// This gives about 0.15 mm clearance above the PCB top.
pcb_thickness = 1.60;
board_touch_preload = 0.05;   // legacy reference only; cap_rim_h is explicit in v28
cap_rim_h = 3.15;             // v28: lid rails/skirt come down 3.25 mm into the 5.00 mm interior
cap_rim_wall = 1.05;
cap_fit_clearance = 0.22;     // clearance against the base inner opening
cap_rim_x0 = inner_x0 + cap_fit_clearance;
cap_rim_x1 = inner_x1 - cap_fit_clearance;
cap_rim_y0 = inner_y0 + cap_fit_clearance;
cap_rim_y1 = inner_y1 - cap_fit_clearance;
cap_rim_r = 1.10;

// v27: remove the rear/back rim segment so the cap only inserts on the front/sides.
// Coordinate note: front/USB side is y=0; back side is y=base_d.
cap_back_rim = false;
cap_back_rim_cut_extra = 0.25;

// Raised perimeter rib on top to fight flex without making the whole cover chunky.
// v31: disabled because the long raised edge/rib was the unwanted bit marked in red.
use_cap_top_rib = false;
cap_top_rib_h = 0.55;
cap_top_rib_w = 1.10;
cap_top_rib_inset = 1.00;

// Small pry slit/notch in the front edge so the cap can be popped back off.
cap_pry_w = 0.00;
cap_pry_h = 0.00;
cap_pry_z0 = 0.25;
cap_pry_x0 = base_w/2 - cap_pry_w/2;

// Snap tab geometry. These are low-profile flexible catches on the cap rim.
// If it is too tight, reduce snap_tab_out or increase snap_receiver_clearance.
snap_tab_w = 6.60;             // length along Y
snap_tab_h = 0.85;             // height along Z
snap_tab_out = 0.42;           // how far tabs stick outward into bottom receiver pockets
snap_tab_z = 0.75;             // from cap underside; lower tabs are easier to pry open
snap_tab_y1 = 8.20;
snap_tab_y2 = 18.15;
snap_receiver_clearance = 0.18;
snap_receiver_depth = 0.55;

// v30: receiver pockets must line up with the cap tabs after the cap is installed.
// The cap is modeled print-side-up with the rim extending upward. In the assembled case,
// the underside of the top plate sits at base_h and the rim/tabs point downward into the tray.
// Therefore a tab at model z = cap_top_h + snap_tab_z maps to installed z = base_h - snap_tab_z.
snap_receiver_z0 = base_h - snap_tab_z - snap_tab_h - snap_receiver_clearance;
snap_receiver_h  = snap_tab_h + 2*snap_receiver_clearance;

// Keep tab and receiver Y positions tied together. If you move a snap tab, the matching
// receiver pocket moves with it.
snap_positions_y = [snap_tab_y1, snap_tab_y2];

// Optional visual helpers: set true to show ghost snap-tab positions inside the bottom.
show_snap_check = false;

// Optional anti-rattle pads on the cap underside.
// v18 had these enabled, but they were floating over the cap cavity. Default OFF.
// Do not turn on unless we redesign them as ribs connected to the rim.
use_cap_board_pads = false;
cap_board_pad_h = 0.25;
cap_board_pad_w = 2.50;
cap_board_pad_d = 0.85;
cap_board_pad_z = cap_rim_h - 0.02;

module snap_receiver_cutters() {
    // v30: receiver pockets are now matched to the actual cap snap tabs.
    // Previously these were using base_h - cap_rim_h + snap_tab_z, which put the pockets
    // too low and made them visually/mechanically miss the tabs.
    for (yy = snap_positions_y) {
        // left receiver, cut into inside face of left wall
        translate([inner_x0 - snap_receiver_depth,
                   yy - snap_tab_w/2 - snap_receiver_clearance,
                   snap_receiver_z0])
            cube([snap_receiver_depth + 0.10,
                  snap_tab_w + 2*snap_receiver_clearance,
                  snap_receiver_h]);

        // right receiver, cut into inside face of right wall
        translate([inner_x1 - 0.10,
                   yy - snap_tab_w/2 - snap_receiver_clearance,
                   snap_receiver_z0])
            cube([snap_receiver_depth + 0.10,
                  snap_tab_w + 2*snap_receiver_clearance,
                  snap_receiver_h]);
    }
}

module snap_check_ghosts() {
    // Installed-position ghost of where the cap tabs land in the bottom tray.
    // These should sit directly inside the receiver pockets.
    if (show_snap_check) {
        color([1,0,0,0.35])
        for (yy = snap_positions_y) {
            translate([inner_x0 - snap_tab_out,
                       yy - snap_tab_w/2,
                       base_h - snap_tab_z - snap_tab_h])
                cube([snap_tab_out, snap_tab_w, snap_tab_h]);
            translate([inner_x1,
                       yy - snap_tab_w/2,
                       base_h - snap_tab_z - snap_tab_h])
                cube([snap_tab_out, snap_tab_w, snap_tab_h]);
        }
    }
}

module pry_relief_cutter_bottom() {
    // Matching shallow front relief on the bottom half, aligned with the cap pry notch.
    translate([cap_pry_x0, -0.03, base_h - 1.25])
        cube([cap_pry_w, wall_t + 0.10, 1.05]);
}

module bottom_clamshell() {
    union() {
        difference() {
            base_case();
            snap_receiver_cutters();
            if (bottom_pry_relief) pry_relief_cutter_bottom();
        }
        snap_check_ghosts();
    }
}

module cap_outer_top_2d() {
    rounded_rect_2d(cap_w, cap_d, cap_corner_r);
}

module cap_button_outer_clearance_2d(cx) {
    union() {
        translate([cx, btn_y]) circle(r=btn_outer_r);
        rect_from_to(cx-btn_clear_w/2, btn_stem_y0, cx+btn_clear_w/2, btn_stem_y1);
    }
}

module cap_button_actuator(cx) {
    // v18: full-thickness island/tongue, flush with the exterior AND inside face of the top.
    // v16 deliberately made these 0.90 mm thick for flex, which made them look recessed/thin.
    linear_extrude(height=top_button_flex_h) button_actuator_2d(cx);

    // Pointed/rounded nub on the inside face that reaches down to the tactile switch
    // after the cap is installed. If buttons do not click, increase top_button_nub_h.
    translate([cx, btn_y, top_button_flex_h - 0.01])
        cylinder(h=top_button_nub_h, r1=top_button_nub_r1, r2=top_button_nub_r2);
}


module button_label_one(txt, cx, cy) {
    // Outside face of the cap is z=0 in this print orientation. Cut upward from just below z=0
    // to engrave the label into the exterior face without creating a separate colored object.
    translate([cx, cy, -0.02])
        linear_extrude(height=button_label_depth + 0.03)
            text(txt, size=button_label_size, font=button_label_font, halign="center", valign="center");
}

module button_label_cutters() {
    if (button_labels) {
        label_y = button_label_on_button ? (btn_y + button_label_y_offset) : (btn_y + button_label_side_y_offset);
        button_label_one(button_label_left, btn_left_x, label_y);
        button_label_one(button_label_right, btn_right_x, label_y);
    }
}

module cap_top_plate() {
    union() {
        difference() {
            rounded_box(cap_w, cap_d, cap_top_h, cap_corner_r);

            // front fingernail notch in the cap edge
            translate([cap_pry_x0, -0.04, cap_pry_z0])
                cube([cap_pry_w, cap_top_h + 0.20, cap_pry_h]);

            // LED opening through top cover. Fill with separate led_window_insert() for clear PLA.
            // v21 uses led_hole_r instead of exact center_hole_r so the clear part is slicer-friendly.
            translate([center_hole_x, center_hole_y, -0.01])
                cylinder(h=cap_top_h + 0.04, r=led_hole_r);

            // Engraved exterior button designations, B/R by default.
            button_label_cutters();

            // Full clearance around each flex button. The thin actuator islands are added back below.
            translate([0,0,-0.01])
                linear_extrude(height=cap_top_h + 0.04) {
                    cap_button_outer_clearance_2d(btn_left_x);
                    cap_button_outer_clearance_2d(btn_right_x);
                }
        }
        cap_button_actuator(btn_left_x);
        cap_button_actuator(btn_right_x);
    }
}

module cap_underside_rim() {
    // Downward rim, modeled above the top plate for easy printing/export orientation.
    // In the actual assembled case this rim faces downward into the tray.
    // v27: the rear/back rim segment can be removed so it does not press/catch at the back of the PCB.
    rim_w = cap_rim_x1 - cap_rim_x0;
    rim_d = cap_rim_y1 - cap_rim_y0;
    translate([cap_rim_x0, cap_rim_y0, cap_top_h])
        difference() {
            difference() {
                linear_extrude(height=cap_rim_h)
                    rounded_rect_2d(rim_w, rim_d, cap_rim_r);
                translate([cap_rim_wall, cap_rim_wall, -0.01])
                    linear_extrude(height=cap_rim_h + 0.02)
                        rounded_rect_2d(rim_w - 2*cap_rim_wall, rim_d - 2*cap_rim_wall, max(cap_rim_r-cap_rim_wall, 0.05));
            }

            // Remove only the back/rear wall of the underside rim.
            // Front/USB rim and side rims remain for alignment and snap engagement.
            if (!cap_back_rim)
                translate([-cap_back_rim_cut_extra, rim_d - cap_rim_wall - cap_back_rim_cut_extra, -0.02])
                    cube([rim_w + 2*cap_back_rim_cut_extra, cap_rim_wall + 2*cap_back_rim_cut_extra, cap_rim_h + 0.04]);
        }
}

module cap_top_stiffening_rib() {
    // Low raised rib on the outside/top surface. Disabled by default in v31.
    if (use_cap_top_rib)
    translate([cap_top_rib_inset, cap_top_rib_inset, cap_top_h])
        difference() {
            linear_extrude(height=cap_top_rib_h)
                rounded_rect_2d(cap_w - 2*cap_top_rib_inset, cap_d - 2*cap_top_rib_inset, max(cap_corner_r-cap_top_rib_inset,0.2));
            translate([cap_top_rib_w, cap_top_rib_w, -0.01])
                linear_extrude(height=cap_top_rib_h + 0.02)
                    rounded_rect_2d(cap_w - 2*cap_top_rib_inset - 2*cap_top_rib_w,
                                    cap_d - 2*cap_top_rib_inset - 2*cap_top_rib_w,
                                    max(cap_corner_r-cap_top_rib_inset-cap_top_rib_w,0.05));
        }
}

module cap_snap_tabs() {
    // Tabs protrude outward from the underside rim into receiver pockets in the bottom half.
    for (yy = snap_positions_y) {
        // left tab
        translate([cap_rim_x0 - snap_tab_out, yy - snap_tab_w/2, cap_top_h + snap_tab_z])
            cube([snap_tab_out, snap_tab_w, snap_tab_h]);
        // right tab
        translate([cap_rim_x1, yy - snap_tab_w/2, cap_top_h + snap_tab_z])
            cube([snap_tab_out, snap_tab_w, snap_tab_h]);
    }
}

module cap_board_pads() {
    // Disabled by default. In v18 these appeared as two detached/floating rectangles.
    // If anti-rattle pads are needed later, make them ribs connected to the cap rim.
    if (use_cap_board_pads) {
        for (xx = [board_x0 + 3.0, board_x0 + board_w - 3.0]) {
            translate([xx - cap_board_pad_w/2, board_y0 + board_d - 2.0, cap_top_h + cap_board_pad_z])
                cube([cap_board_pad_w, cap_board_pad_d, cap_board_pad_h]);
        }
    }
}

module top_clamshell_cap() {
    difference() {
        union() {
            cap_top_plate();
            cap_underside_rim();
            cap_top_stiffening_rib();
            cap_snap_tabs();
            cap_board_pads();
        }
        cap_usb_notch_cutter();
    }
}

module top_clamshell_cap_print_oriented() {
    // For viewing/export, the cap is shown open/rim-up so the flat outside top is on the bed.
    // The rim is on top in this orientation; when installed, flip it over onto the base.
    top_clamshell_cap();
}

// Layout/export behavior:
// For multi-material LED: export/import "top" and "led_insert" as separate parts.
// They share the same XY/Z origin, so when loaded together as an assembly the insert aligns with the top hole.
// Do NOT export "top_with_led_preview" for MMU use, because STL/CSG will merge touching solids.
if (export_part == "all") {
    // LEFT: bottom tray
    bottom_clamshell();
    if (show_board_check) board_preview();

    // MIDDLE: actual snap-on TOP LID / cap, with clear LED pipe shown installed for preview.
    // For MMU export, export/import top and led_insert separately as an assembly.
    translate([base_w + part_gap, 0, 0]) {
        top_clamshell_cap_print_oriented();
        led_window_insert();
    }

    // RIGHT: duplicate clear LED insert laid out alone for visual sanity checking.
    translate([base_w + part_gap + cap_w + part_gap, 0, 0])
        led_window_insert();
}
else if (export_part == "base" || export_part == "bottom") {
    bottom_clamshell();
    if (show_board_check) board_preview();
}
else if (export_part == "led_insert") {
    // Same origin as top_clamshell_cap_print_oriented(); import this WITH "top" as an assembly.
    led_window_insert();
}
else if (export_part == "led_insert_layout") {
    // Just the insert laid out at world origin for printing separately, not aligned assembly import.
    // Use led_insert instead for aligned AMS/MMU assembly import.
    led_window_insert();
}
else if (export_part == "lid" || export_part == "top" || export_part == "cap" || export_part == "top_lid") {
    // Top only. LED insert intentionally omitted so it remains a true separate object.
    top_clamshell_cap_print_oriented();
}
else if (export_part == "top_with_led_preview") {
    // Preview only. Not recommended for export to a multi-material slicer because it may merge into one mesh.
    top_clamshell_cap_print_oriented();
    if (show_led_insert) led_window_insert();
}
else if (export_part == "assembled_preview") {
    bottom_clamshell();
    if (show_board_check) board_preview();
    // Ghosted installed cap approximation: cap shown above base for visual relation.
    color([0.0, 0.8, 1.0, 0.45]) translate([0,0,base_h]) {
        top_clamshell_cap_print_oriented();
        if (show_led_insert) led_window_insert();
    }
}
